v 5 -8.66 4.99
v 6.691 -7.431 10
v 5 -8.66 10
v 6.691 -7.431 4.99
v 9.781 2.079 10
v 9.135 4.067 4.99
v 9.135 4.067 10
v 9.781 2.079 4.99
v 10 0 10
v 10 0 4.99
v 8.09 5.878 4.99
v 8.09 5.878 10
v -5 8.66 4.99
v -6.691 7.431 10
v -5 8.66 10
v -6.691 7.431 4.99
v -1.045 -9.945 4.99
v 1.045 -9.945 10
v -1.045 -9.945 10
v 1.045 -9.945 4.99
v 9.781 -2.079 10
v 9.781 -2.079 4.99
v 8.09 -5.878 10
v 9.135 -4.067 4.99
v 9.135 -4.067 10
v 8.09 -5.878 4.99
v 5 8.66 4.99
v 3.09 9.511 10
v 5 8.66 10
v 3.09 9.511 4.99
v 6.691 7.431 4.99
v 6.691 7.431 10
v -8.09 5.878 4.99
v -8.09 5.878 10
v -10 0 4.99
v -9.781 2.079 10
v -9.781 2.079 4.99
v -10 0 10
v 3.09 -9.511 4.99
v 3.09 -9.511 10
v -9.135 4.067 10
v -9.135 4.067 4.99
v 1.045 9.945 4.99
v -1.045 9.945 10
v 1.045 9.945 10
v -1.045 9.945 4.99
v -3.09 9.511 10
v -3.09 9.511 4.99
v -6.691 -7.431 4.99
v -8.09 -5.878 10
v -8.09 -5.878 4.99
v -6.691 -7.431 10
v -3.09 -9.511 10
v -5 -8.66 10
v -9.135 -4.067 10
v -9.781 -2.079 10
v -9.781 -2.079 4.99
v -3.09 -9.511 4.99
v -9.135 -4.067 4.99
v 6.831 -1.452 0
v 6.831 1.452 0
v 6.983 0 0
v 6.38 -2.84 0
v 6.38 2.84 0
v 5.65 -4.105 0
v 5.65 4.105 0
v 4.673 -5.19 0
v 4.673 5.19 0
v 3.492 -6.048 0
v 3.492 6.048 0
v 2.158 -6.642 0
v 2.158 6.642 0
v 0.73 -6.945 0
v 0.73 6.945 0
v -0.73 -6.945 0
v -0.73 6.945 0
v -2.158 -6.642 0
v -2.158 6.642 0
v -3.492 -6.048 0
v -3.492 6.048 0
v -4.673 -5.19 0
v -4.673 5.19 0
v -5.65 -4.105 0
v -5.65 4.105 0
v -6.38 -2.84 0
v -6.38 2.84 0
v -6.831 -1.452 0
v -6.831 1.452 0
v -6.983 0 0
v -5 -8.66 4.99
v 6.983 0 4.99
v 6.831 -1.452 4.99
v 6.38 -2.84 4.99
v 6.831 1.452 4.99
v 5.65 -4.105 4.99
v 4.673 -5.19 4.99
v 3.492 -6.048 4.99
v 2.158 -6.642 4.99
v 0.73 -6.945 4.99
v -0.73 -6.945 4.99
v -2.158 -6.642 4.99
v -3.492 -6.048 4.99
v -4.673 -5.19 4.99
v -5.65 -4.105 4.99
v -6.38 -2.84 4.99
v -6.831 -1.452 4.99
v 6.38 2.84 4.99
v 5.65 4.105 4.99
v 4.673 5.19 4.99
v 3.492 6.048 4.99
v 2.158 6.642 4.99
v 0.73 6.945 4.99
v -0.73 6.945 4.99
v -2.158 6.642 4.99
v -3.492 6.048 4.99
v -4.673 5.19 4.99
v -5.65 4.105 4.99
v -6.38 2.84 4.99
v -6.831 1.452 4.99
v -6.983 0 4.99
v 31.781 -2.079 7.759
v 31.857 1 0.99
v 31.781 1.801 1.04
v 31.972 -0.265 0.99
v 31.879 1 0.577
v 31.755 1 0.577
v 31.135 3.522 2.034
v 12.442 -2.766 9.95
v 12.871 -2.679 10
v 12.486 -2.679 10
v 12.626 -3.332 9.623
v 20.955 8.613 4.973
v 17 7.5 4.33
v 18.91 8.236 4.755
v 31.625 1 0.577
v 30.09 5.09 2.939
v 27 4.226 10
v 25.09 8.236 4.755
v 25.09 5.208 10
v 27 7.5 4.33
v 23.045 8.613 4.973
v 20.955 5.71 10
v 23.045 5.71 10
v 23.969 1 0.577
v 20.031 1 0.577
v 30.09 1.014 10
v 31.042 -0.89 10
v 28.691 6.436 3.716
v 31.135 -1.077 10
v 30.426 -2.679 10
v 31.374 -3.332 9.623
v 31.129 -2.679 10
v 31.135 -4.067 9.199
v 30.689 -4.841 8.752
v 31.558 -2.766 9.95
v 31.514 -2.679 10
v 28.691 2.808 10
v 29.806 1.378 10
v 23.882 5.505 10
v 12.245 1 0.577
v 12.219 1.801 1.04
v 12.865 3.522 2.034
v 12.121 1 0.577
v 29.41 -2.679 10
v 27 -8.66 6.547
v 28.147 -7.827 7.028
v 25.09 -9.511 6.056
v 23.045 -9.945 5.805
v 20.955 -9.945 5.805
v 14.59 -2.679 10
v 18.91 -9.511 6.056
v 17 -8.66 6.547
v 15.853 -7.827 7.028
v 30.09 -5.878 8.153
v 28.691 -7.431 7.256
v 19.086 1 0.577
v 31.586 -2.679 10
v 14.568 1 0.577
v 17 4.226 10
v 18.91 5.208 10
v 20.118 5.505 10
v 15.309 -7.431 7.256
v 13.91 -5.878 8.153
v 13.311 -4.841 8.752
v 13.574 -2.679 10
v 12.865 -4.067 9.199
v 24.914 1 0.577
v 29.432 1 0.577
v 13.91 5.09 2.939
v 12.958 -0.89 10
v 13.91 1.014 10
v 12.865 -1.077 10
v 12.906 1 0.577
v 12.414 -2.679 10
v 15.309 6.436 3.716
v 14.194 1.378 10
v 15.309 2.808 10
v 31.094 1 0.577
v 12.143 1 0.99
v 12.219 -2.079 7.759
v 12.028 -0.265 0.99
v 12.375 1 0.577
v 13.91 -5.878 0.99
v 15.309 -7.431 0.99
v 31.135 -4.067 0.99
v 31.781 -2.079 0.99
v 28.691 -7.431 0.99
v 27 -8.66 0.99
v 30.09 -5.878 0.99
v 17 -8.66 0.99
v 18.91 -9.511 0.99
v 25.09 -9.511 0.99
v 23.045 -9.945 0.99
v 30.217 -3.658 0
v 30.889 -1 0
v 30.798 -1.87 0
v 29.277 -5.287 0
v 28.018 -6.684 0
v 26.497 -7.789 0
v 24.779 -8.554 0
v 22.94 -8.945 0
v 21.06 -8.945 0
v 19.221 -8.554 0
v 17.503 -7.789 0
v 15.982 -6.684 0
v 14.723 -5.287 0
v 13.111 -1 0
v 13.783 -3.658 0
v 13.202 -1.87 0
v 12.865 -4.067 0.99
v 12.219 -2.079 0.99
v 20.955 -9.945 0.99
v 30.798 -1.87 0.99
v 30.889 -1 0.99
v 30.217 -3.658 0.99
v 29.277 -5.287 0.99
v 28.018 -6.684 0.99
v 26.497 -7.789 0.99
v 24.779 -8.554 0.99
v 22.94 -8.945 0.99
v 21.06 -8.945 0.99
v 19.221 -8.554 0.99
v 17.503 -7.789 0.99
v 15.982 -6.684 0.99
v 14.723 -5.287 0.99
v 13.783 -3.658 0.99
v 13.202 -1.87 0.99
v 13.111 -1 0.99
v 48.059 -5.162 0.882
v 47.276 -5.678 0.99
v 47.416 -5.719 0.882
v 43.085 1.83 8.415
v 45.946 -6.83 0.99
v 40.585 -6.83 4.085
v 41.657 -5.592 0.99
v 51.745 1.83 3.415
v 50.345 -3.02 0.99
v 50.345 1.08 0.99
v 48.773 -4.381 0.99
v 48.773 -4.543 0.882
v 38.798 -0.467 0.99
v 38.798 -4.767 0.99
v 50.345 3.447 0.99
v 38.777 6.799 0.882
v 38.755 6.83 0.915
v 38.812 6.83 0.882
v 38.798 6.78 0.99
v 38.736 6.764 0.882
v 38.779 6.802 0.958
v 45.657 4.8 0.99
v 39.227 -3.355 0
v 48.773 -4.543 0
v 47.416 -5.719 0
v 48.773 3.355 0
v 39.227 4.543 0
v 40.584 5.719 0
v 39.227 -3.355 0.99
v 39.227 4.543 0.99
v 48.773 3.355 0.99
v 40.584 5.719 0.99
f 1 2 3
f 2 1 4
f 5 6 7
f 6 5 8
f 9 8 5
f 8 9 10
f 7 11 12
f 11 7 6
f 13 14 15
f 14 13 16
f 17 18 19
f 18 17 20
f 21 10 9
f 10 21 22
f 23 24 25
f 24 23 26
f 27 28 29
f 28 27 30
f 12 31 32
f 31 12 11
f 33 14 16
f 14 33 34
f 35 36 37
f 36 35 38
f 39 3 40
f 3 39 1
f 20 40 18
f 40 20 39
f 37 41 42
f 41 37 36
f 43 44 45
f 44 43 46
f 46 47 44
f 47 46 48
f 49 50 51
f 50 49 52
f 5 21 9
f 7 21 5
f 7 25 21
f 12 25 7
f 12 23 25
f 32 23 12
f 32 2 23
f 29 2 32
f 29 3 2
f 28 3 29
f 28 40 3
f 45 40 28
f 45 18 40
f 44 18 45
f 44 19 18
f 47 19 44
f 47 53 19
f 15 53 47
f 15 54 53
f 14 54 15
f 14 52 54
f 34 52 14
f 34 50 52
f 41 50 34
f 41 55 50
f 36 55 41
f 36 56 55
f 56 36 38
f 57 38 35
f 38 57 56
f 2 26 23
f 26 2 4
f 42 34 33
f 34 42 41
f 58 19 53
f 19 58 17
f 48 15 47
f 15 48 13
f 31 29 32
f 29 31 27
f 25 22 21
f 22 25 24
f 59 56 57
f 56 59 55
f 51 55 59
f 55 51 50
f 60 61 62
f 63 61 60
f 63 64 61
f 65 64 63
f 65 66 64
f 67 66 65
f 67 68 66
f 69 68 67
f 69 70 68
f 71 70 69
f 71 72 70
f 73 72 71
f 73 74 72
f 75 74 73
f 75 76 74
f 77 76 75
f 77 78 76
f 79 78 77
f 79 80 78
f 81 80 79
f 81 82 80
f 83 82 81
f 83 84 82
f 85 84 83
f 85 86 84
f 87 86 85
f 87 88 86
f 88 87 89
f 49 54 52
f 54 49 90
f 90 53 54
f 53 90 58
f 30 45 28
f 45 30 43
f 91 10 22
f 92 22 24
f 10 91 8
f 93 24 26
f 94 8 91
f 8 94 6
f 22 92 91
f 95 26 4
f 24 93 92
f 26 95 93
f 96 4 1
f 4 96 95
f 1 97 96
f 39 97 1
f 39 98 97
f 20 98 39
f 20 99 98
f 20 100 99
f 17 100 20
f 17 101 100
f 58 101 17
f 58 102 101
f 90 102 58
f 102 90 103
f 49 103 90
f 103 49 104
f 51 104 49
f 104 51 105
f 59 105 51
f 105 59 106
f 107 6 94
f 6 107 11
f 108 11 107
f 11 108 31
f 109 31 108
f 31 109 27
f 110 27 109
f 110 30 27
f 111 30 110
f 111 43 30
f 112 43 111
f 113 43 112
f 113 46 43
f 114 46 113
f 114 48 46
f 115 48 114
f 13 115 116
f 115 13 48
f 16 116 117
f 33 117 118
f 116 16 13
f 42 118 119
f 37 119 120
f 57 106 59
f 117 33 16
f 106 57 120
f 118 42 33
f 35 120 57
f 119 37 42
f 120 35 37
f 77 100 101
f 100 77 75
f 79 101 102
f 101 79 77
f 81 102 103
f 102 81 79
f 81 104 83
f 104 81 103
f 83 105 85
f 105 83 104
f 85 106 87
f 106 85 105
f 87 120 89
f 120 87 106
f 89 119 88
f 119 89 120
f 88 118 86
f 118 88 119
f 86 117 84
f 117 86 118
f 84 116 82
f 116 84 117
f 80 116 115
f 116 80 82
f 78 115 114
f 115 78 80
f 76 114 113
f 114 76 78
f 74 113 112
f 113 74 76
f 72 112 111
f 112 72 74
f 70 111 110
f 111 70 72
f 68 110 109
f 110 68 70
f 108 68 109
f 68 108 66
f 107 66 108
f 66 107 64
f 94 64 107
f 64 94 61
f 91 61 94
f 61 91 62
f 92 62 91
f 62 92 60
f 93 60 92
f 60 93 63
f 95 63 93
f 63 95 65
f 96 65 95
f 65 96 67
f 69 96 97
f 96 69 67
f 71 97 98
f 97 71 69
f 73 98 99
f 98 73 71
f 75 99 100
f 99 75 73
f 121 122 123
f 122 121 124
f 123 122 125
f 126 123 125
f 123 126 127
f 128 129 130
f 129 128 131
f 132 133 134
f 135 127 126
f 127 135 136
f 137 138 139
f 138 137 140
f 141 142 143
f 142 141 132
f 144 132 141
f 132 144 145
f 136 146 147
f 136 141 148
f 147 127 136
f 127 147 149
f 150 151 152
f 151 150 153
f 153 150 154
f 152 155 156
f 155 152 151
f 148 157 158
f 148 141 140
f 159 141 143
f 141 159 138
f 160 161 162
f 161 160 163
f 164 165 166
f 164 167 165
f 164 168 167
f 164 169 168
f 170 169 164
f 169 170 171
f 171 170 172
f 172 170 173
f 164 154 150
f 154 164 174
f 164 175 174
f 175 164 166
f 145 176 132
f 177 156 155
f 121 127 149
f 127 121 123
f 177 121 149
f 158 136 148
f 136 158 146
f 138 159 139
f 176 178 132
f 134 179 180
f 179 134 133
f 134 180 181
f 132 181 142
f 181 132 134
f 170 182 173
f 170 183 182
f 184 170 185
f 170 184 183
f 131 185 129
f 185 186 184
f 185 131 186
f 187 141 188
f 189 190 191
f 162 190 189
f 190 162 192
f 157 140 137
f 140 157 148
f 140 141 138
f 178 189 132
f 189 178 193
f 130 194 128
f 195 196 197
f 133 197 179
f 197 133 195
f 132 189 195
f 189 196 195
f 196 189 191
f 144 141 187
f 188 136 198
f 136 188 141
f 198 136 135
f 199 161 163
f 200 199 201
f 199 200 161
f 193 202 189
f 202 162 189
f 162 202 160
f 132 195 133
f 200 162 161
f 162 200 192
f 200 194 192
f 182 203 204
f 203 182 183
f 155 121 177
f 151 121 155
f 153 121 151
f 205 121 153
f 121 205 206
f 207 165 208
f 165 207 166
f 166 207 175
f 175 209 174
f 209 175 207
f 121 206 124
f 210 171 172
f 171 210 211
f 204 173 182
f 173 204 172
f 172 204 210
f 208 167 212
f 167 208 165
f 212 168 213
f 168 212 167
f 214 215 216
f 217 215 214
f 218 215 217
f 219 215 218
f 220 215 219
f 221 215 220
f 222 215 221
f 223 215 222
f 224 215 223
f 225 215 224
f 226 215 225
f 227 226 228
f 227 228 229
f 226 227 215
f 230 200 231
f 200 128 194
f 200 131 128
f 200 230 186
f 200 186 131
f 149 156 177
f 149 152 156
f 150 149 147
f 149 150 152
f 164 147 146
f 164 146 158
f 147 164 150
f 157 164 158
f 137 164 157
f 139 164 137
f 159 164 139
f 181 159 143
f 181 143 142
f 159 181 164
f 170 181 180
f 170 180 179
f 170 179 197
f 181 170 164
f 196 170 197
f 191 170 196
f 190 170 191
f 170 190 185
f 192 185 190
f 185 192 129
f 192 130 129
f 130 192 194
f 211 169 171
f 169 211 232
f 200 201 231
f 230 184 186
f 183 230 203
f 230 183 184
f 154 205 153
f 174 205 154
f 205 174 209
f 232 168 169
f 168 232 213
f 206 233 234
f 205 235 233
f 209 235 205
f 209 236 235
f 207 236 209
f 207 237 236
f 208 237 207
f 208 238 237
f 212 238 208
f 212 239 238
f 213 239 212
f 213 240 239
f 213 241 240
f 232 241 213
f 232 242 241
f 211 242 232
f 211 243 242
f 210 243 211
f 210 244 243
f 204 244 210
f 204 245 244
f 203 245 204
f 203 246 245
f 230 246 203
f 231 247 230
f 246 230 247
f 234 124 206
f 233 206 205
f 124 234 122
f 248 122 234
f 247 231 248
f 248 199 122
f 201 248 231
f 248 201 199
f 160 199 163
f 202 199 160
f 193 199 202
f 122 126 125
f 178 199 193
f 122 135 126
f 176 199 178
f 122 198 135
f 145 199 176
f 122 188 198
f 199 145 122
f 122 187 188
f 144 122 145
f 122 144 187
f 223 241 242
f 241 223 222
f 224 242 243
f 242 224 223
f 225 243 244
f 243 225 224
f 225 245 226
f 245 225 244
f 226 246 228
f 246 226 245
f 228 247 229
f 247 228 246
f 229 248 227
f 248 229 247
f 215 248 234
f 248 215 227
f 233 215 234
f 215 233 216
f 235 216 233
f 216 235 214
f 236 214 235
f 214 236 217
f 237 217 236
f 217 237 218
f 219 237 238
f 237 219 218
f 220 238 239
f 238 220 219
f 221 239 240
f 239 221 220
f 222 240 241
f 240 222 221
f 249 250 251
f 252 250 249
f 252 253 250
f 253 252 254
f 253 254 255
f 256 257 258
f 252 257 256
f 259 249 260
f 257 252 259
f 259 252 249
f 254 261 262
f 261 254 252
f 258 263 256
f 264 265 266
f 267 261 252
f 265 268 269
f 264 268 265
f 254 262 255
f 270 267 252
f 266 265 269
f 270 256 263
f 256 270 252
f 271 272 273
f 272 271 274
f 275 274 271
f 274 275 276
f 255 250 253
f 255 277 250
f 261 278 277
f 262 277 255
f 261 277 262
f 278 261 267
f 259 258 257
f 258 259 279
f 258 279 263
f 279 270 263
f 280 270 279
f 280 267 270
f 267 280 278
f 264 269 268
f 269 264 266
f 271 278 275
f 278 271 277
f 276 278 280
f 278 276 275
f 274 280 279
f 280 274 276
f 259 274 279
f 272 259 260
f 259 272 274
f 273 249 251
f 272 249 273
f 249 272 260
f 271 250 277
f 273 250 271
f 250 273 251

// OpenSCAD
// file: transform.scad
separate(10) {cylinder(); cube(); cylinder();}


// =================================================
// === LIB STARTS HERE =============================


module lift(z=0){
    translate([0,0,z]) children();
}


module separate(shift=0){
    for (i=[0:$children]){
        translate([shift*i,0,0]) children(i);
    }
}
// main file
use <transform.scad>

separate(22){
// example 1
faska(3,5) cylinder(h=10, r=10);

// example 2
faska() intersection(){
    rotate([30,0,0]) cylinder(h=10, r=10);
    cylinder(h=10, r=10);
}

// example 3
faska() intersection(){
    rotate([30,30,0]) cube([10,10,10], center=true);
    cylinder(h=10, r=10);
}
}

// =================================================
// === LIB STARTS HERE =============================

module faska(r=1, h=1){
    difference(){
        union() { children(); }
        
        lift(-0.01) linear_extrude(h) difference(){
            offset(r=r, chamfer=false)
                projection(cut=true)
                    union() { children(); };         
            
            offset(r=-r, chamfer=false)
                projection(cut=true)
                    union() { children(); };              
}
    }
}
